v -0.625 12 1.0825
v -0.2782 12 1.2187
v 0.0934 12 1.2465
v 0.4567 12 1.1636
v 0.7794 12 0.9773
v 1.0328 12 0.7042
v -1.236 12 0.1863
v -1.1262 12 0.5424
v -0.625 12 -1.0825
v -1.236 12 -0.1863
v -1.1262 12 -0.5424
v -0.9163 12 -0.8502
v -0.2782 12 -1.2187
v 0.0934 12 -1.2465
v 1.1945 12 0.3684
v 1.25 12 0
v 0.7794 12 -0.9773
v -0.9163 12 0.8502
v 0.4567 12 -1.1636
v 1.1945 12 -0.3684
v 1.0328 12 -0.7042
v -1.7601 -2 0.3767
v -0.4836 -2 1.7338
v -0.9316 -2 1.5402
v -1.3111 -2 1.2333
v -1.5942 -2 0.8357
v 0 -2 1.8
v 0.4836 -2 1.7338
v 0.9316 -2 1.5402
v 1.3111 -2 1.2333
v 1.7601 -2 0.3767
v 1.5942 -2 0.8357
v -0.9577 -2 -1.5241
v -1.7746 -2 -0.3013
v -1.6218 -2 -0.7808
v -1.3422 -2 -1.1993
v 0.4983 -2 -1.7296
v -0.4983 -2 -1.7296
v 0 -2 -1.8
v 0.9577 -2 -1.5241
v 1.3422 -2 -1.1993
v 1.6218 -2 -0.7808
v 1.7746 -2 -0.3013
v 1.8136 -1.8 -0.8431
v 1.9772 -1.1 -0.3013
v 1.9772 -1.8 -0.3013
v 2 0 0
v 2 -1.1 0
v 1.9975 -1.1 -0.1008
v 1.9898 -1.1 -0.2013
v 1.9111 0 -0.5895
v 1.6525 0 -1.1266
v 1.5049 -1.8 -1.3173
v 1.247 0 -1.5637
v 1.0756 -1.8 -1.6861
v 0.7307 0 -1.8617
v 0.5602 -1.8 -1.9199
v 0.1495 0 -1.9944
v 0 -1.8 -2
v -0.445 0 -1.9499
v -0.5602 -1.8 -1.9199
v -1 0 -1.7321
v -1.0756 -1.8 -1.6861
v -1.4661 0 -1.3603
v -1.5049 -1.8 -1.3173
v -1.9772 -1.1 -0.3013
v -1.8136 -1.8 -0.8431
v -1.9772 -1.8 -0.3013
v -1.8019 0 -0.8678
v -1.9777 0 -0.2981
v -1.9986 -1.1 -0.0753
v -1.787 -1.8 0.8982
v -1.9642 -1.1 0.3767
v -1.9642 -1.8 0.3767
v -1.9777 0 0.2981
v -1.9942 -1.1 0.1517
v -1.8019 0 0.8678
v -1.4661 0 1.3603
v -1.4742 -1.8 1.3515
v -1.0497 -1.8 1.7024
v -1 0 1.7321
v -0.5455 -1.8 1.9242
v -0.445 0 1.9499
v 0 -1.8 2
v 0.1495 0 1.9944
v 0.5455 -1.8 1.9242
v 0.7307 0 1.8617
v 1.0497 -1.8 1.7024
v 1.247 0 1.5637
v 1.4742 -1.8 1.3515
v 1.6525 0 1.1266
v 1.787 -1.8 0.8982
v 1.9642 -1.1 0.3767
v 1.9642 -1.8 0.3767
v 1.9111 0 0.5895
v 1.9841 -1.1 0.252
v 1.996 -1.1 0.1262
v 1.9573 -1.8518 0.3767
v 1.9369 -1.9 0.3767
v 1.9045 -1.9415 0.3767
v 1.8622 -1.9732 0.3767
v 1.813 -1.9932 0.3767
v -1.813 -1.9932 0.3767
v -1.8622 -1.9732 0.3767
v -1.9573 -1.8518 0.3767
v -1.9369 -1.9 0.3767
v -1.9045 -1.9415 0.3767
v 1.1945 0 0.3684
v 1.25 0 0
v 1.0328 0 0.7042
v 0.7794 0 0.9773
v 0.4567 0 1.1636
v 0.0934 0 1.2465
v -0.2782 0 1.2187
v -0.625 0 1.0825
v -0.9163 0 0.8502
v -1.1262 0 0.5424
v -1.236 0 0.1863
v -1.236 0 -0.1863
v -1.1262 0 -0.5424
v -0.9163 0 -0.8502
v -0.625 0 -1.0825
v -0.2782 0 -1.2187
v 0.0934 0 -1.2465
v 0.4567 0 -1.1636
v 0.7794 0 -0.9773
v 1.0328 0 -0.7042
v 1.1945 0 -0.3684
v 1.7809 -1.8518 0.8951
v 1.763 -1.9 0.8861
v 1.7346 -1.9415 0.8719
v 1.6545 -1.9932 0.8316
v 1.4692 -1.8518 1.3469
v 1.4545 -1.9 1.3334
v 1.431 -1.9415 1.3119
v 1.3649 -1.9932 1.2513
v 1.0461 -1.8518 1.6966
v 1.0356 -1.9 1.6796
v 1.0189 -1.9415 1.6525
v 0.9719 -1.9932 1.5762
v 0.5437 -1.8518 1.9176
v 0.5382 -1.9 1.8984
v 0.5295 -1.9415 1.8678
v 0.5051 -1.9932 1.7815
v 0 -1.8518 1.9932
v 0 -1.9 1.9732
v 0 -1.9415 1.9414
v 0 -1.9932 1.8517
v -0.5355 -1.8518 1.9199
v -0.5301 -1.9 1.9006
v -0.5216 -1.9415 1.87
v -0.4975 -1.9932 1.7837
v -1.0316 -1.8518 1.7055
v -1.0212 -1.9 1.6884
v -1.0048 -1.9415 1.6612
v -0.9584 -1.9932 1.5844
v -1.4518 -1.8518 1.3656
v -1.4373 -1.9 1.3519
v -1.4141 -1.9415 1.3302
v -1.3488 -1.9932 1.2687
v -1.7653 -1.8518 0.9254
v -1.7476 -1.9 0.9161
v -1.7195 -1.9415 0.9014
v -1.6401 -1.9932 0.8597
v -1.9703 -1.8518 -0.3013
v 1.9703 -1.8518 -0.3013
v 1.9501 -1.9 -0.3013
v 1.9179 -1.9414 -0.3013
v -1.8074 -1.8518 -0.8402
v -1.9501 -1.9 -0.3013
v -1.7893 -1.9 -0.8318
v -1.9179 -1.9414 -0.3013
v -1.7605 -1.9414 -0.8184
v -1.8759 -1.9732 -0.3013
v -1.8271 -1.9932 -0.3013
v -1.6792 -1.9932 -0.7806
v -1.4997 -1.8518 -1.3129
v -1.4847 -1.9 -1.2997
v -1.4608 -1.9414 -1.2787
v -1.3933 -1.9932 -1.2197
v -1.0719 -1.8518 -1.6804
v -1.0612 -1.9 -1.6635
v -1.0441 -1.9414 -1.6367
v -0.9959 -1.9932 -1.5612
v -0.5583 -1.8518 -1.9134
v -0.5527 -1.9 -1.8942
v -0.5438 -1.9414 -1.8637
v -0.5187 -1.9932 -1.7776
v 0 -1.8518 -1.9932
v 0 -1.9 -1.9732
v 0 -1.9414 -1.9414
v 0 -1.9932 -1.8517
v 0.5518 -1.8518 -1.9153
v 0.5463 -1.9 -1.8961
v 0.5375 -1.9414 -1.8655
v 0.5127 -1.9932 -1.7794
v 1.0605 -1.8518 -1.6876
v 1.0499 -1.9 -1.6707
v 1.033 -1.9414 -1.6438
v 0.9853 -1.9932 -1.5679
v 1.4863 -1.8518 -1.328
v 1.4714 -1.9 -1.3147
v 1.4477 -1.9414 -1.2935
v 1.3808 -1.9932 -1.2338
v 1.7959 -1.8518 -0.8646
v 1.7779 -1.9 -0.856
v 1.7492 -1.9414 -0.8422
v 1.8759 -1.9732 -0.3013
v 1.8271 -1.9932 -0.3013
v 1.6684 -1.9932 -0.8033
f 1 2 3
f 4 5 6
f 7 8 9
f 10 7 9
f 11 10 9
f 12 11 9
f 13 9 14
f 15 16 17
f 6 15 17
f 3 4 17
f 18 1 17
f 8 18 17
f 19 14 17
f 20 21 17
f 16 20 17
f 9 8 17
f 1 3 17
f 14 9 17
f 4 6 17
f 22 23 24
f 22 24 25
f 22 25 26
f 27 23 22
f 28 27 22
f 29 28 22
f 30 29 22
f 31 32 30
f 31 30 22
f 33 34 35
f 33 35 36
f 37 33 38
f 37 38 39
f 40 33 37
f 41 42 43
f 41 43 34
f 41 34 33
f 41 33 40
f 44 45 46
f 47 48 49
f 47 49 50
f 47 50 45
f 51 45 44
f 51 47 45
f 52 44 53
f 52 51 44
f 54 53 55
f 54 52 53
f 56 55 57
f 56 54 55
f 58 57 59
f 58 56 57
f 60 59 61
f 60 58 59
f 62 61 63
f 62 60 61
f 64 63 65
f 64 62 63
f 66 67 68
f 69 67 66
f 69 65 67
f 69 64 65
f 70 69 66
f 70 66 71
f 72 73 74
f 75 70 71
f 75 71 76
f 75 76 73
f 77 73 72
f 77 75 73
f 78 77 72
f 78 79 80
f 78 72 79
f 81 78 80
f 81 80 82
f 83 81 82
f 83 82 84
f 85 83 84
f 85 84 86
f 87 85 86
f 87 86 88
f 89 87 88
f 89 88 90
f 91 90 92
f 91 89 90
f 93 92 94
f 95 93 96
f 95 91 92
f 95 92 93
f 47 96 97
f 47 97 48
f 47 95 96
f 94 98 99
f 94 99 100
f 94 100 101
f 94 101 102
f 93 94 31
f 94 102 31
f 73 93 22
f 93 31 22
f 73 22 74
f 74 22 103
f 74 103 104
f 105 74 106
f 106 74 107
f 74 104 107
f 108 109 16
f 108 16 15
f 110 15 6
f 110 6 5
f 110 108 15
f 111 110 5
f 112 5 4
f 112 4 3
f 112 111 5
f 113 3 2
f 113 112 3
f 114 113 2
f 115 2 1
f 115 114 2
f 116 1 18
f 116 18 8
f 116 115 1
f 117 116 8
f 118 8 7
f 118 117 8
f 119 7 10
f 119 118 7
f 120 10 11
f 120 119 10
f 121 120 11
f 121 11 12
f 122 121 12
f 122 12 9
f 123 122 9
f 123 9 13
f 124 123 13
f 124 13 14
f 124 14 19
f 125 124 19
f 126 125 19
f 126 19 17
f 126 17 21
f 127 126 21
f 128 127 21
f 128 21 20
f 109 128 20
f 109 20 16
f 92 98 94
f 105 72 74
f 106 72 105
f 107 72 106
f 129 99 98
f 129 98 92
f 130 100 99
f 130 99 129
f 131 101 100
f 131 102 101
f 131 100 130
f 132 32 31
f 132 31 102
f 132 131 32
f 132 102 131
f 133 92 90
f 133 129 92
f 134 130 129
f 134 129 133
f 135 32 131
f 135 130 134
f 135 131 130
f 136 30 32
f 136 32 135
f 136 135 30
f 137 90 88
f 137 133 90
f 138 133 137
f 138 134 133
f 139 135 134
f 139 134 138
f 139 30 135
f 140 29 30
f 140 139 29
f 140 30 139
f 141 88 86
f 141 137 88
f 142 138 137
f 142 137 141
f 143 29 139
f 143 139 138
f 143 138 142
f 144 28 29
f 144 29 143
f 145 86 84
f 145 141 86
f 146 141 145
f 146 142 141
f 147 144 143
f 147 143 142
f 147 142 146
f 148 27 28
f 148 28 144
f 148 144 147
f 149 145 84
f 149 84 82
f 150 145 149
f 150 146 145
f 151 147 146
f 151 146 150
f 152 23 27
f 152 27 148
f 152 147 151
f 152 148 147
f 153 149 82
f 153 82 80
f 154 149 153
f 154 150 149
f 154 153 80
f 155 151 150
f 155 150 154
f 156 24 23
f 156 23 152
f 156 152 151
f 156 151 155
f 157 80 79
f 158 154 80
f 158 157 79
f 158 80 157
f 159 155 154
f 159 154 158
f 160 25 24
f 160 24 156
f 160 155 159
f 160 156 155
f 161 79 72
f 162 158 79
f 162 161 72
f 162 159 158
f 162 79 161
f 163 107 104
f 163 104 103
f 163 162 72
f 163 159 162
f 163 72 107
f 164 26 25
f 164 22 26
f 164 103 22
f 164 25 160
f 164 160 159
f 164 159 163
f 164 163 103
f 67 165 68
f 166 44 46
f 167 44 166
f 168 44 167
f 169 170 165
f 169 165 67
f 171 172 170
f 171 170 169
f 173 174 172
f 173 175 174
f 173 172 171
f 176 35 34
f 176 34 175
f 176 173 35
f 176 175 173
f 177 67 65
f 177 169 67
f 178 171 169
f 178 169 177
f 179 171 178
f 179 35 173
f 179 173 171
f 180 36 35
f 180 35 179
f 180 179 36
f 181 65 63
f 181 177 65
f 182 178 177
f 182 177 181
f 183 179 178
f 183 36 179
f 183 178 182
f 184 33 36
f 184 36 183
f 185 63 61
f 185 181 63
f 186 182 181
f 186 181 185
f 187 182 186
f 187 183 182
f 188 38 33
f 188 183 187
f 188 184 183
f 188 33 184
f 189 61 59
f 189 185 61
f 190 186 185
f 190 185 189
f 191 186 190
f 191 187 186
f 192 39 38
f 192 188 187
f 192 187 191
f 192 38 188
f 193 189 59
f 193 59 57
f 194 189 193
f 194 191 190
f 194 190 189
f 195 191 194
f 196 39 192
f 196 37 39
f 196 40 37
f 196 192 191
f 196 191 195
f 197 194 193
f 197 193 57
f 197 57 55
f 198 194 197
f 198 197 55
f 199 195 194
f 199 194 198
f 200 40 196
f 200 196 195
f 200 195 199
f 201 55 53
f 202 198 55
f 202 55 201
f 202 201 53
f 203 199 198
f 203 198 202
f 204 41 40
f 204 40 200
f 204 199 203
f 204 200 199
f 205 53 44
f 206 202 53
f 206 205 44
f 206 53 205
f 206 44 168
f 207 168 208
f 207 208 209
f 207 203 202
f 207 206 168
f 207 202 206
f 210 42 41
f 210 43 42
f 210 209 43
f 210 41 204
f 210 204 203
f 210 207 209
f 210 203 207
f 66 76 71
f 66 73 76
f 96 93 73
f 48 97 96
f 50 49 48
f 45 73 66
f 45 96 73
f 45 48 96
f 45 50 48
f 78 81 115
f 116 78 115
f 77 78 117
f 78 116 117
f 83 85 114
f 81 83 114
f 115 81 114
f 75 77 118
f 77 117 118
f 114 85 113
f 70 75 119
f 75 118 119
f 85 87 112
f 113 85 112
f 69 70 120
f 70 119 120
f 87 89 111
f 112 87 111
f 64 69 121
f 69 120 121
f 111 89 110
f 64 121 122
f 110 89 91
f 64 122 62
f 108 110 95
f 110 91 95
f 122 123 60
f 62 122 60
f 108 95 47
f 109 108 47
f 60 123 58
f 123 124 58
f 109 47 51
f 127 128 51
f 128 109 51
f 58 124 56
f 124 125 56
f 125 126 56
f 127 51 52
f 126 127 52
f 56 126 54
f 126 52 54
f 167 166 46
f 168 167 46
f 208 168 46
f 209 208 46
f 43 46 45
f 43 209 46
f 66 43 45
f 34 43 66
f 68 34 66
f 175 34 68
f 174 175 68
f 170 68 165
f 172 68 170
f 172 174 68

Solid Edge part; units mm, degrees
sketch "Sketch1" plane through (0, 0, 0) normal (0, -1, 0) x (1, 0, 0)
  circle A0 centre (0, 0) radius 2
extrude "Protrusion1" add sketch "Sketch1" along normal blind 2
sketch "Sketch2" plane through (0, 0, 0) normal (0, -1, 0) x (1, 0, 0)
  circle A0 centre (0, 0) radius 1.25
extrude "ExtrudedProtrusion_2" add sketch "Sketch2" against normal blind 12
sketch "Sketch3" plane through (0, -2, 0) normal (0, -1, 0) x (1, 0, 0)
  line L0 (-1.9642, 0.3767) -> (1.9642, 0.3767)
  line L1 (1.9772, -0.3013) -> (-1.9772, -0.3013)
  arc A0 (1.9642, 0.3767) -> (1.9772, -0.3013) centre (0, 0) cw
extrude "ExtrudedCutout_1" cut sketch "Sketch3" against normal blind 0.9 material side at (0, -2, 0.3267)
cosmetic_thread "Thread1" size "M2.5"
fillet "Round_1" radius 0.2 2 edges at (0, -2, 2) (0, -2, -2)
properties material "Nylon, general purpose"
